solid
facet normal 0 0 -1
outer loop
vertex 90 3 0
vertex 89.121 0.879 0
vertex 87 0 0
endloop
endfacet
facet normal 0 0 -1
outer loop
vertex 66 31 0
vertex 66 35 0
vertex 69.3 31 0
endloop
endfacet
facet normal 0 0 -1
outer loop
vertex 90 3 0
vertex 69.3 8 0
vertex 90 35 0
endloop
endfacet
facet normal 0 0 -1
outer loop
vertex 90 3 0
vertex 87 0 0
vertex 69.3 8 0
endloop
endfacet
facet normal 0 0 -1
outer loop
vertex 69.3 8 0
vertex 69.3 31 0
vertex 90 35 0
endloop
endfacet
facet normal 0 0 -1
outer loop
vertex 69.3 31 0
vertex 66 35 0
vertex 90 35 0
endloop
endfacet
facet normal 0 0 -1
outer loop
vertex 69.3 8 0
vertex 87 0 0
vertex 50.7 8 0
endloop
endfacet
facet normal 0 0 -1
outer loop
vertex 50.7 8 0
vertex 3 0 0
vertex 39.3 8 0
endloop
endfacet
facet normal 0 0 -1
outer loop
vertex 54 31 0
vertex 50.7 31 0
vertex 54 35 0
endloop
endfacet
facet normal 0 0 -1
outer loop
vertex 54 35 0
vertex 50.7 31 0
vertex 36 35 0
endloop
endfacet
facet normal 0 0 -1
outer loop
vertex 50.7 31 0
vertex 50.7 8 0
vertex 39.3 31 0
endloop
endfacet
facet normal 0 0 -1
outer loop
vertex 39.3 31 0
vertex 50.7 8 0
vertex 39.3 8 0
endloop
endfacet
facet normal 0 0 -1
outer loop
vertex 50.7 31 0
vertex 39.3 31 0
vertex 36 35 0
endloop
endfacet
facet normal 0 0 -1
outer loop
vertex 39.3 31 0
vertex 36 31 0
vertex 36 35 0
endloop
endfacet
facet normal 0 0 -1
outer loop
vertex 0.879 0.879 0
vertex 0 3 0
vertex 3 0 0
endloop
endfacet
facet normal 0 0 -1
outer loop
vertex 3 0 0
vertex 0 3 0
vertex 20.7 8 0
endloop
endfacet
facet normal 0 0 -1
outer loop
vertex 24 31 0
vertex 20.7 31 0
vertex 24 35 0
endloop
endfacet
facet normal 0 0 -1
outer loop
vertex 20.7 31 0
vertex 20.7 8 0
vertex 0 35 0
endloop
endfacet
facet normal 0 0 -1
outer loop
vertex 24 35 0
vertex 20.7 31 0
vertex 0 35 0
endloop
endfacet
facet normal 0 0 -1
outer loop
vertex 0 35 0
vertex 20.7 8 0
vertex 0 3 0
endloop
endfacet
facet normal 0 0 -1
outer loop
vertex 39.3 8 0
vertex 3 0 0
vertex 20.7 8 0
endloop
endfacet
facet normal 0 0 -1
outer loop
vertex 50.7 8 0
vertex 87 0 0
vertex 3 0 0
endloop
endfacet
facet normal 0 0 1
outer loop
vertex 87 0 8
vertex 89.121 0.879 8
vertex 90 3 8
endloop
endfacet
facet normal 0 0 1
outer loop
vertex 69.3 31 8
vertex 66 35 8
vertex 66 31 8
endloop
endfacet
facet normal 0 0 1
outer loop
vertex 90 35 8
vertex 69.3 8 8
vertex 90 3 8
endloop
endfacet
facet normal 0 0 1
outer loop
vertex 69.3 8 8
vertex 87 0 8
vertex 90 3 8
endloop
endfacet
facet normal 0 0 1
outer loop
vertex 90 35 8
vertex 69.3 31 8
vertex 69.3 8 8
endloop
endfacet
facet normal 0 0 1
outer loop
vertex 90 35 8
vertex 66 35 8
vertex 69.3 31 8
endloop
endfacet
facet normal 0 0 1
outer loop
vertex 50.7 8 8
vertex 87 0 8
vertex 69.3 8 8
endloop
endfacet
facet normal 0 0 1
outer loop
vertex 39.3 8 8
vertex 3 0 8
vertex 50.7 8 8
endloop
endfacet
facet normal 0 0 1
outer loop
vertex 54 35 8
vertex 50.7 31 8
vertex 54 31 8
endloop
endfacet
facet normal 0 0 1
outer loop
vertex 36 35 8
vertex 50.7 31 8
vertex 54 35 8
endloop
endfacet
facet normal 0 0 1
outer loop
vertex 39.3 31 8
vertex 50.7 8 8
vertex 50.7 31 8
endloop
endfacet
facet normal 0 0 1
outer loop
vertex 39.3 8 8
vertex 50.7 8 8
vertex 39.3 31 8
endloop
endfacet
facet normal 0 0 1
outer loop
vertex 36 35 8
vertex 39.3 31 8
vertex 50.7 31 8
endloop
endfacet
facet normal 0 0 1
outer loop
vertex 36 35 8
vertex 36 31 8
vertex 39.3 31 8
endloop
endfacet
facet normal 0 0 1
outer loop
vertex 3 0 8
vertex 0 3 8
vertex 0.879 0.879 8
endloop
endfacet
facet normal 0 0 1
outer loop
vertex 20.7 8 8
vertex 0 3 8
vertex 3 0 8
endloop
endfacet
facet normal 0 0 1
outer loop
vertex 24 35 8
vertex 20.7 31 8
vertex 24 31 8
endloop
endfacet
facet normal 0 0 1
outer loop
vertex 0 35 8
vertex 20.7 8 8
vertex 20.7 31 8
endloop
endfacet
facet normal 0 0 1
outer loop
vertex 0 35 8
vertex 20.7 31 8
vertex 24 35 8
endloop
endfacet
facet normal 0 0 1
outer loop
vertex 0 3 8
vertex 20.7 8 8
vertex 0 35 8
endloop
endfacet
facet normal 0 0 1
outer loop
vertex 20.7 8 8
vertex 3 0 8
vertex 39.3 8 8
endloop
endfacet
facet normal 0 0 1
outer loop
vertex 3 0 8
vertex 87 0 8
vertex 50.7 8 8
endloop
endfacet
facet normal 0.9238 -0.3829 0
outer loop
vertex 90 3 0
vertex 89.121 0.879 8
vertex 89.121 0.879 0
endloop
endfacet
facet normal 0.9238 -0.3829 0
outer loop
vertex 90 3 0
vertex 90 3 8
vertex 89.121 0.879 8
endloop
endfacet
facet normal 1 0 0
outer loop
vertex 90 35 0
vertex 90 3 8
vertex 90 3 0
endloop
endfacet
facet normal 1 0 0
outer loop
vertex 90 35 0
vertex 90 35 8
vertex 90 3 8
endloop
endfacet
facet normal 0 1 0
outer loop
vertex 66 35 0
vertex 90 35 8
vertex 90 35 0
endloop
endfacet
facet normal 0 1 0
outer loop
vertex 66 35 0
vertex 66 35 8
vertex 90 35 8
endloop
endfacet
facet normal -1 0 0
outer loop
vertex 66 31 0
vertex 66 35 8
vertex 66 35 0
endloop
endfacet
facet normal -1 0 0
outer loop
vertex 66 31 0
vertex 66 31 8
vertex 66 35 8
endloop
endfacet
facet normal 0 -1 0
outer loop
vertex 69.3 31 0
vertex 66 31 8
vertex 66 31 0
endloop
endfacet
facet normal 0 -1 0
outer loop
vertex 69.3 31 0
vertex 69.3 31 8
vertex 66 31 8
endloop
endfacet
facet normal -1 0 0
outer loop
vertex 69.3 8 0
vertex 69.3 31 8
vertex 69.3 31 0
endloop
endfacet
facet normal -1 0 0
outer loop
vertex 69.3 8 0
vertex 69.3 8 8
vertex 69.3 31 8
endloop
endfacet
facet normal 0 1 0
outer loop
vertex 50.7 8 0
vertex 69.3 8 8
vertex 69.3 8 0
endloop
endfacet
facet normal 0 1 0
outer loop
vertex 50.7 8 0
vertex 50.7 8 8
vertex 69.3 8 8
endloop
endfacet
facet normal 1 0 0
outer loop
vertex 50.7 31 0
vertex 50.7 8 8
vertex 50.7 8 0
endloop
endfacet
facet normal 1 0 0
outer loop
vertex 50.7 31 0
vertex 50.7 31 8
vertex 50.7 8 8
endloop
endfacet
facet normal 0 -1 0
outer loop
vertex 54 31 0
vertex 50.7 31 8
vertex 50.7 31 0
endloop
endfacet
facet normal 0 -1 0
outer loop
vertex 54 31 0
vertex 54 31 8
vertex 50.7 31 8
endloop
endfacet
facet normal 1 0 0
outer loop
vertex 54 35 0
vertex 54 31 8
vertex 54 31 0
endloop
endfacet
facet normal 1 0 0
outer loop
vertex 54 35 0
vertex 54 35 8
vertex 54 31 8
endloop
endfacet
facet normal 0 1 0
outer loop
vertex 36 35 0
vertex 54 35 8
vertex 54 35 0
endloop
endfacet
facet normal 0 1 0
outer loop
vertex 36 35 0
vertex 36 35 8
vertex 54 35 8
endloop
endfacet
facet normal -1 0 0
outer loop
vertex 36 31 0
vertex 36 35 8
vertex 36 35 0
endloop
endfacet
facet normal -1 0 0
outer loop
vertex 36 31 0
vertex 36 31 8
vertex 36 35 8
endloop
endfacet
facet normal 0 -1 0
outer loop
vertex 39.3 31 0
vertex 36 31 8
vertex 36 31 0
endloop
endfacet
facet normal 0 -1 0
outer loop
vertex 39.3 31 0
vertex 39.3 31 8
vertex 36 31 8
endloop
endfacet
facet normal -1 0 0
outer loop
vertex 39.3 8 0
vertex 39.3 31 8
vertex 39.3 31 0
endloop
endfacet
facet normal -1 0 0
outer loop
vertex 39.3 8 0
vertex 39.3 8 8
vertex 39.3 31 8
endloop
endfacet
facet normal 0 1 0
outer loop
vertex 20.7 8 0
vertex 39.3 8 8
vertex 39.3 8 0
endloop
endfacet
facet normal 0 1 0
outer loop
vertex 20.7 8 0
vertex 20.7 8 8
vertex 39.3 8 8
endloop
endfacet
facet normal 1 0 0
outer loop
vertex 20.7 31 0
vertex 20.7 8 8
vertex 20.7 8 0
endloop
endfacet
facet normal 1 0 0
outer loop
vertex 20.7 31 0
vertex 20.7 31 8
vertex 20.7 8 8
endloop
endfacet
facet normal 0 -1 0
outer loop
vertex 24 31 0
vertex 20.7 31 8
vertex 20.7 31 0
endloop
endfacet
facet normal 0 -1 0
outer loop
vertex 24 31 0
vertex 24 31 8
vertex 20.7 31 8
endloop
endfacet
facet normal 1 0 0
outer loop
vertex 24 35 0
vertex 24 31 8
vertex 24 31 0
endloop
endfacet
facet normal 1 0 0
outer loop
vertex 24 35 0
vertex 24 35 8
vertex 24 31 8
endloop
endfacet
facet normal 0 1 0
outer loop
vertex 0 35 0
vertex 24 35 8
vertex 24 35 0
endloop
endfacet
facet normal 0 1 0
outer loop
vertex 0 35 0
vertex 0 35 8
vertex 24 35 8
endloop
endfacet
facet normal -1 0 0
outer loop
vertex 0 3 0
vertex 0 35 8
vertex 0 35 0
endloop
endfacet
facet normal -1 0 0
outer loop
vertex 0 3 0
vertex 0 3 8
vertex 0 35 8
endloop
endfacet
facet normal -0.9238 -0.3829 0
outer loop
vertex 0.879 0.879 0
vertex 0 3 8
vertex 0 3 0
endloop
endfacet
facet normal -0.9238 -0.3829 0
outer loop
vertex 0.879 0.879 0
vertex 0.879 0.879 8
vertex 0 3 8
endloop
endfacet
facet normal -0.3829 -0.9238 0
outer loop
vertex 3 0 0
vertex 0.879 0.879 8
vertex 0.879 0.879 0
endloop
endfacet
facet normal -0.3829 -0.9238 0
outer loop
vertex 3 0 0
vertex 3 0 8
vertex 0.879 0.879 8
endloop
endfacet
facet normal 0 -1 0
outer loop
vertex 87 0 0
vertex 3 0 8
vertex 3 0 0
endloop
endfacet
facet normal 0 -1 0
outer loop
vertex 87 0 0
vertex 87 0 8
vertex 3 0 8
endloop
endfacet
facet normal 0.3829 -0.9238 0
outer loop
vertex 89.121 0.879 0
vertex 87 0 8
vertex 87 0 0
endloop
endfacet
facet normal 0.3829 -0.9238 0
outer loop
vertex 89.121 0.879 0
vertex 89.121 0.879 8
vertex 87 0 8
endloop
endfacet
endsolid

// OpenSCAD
$fn = 32;

// ----------------------------------------------------------------------
// Window plate: 90 x 35 mm, 2 open windows
// ----------------------------------------------------------------------

// --- parameters (mm) ---
profile_height = 8;       // extrusion height
profile_points = 24;      // points of the closed outline

profile = [[0, 3], [0.879, 0.879], [3, 0], [87, 0], [89.121, 0.879], [90, 3], [90, 35], [66, 35], [66, 31], [69.3, 31], [69.3, 8], [50.7, 8], [50.7, 31], [54, 31], [54, 35], [36, 35], [36, 31], [39.3, 31], [39.3, 8], [20.7, 8], [20.7, 31], [24, 31], [24, 35], [0, 35]];  // single closed polygon, 24 points, counter clockwise

// --- the one profile operation ---
linear_extrude(height = profile_height) polygon(points = profile);
